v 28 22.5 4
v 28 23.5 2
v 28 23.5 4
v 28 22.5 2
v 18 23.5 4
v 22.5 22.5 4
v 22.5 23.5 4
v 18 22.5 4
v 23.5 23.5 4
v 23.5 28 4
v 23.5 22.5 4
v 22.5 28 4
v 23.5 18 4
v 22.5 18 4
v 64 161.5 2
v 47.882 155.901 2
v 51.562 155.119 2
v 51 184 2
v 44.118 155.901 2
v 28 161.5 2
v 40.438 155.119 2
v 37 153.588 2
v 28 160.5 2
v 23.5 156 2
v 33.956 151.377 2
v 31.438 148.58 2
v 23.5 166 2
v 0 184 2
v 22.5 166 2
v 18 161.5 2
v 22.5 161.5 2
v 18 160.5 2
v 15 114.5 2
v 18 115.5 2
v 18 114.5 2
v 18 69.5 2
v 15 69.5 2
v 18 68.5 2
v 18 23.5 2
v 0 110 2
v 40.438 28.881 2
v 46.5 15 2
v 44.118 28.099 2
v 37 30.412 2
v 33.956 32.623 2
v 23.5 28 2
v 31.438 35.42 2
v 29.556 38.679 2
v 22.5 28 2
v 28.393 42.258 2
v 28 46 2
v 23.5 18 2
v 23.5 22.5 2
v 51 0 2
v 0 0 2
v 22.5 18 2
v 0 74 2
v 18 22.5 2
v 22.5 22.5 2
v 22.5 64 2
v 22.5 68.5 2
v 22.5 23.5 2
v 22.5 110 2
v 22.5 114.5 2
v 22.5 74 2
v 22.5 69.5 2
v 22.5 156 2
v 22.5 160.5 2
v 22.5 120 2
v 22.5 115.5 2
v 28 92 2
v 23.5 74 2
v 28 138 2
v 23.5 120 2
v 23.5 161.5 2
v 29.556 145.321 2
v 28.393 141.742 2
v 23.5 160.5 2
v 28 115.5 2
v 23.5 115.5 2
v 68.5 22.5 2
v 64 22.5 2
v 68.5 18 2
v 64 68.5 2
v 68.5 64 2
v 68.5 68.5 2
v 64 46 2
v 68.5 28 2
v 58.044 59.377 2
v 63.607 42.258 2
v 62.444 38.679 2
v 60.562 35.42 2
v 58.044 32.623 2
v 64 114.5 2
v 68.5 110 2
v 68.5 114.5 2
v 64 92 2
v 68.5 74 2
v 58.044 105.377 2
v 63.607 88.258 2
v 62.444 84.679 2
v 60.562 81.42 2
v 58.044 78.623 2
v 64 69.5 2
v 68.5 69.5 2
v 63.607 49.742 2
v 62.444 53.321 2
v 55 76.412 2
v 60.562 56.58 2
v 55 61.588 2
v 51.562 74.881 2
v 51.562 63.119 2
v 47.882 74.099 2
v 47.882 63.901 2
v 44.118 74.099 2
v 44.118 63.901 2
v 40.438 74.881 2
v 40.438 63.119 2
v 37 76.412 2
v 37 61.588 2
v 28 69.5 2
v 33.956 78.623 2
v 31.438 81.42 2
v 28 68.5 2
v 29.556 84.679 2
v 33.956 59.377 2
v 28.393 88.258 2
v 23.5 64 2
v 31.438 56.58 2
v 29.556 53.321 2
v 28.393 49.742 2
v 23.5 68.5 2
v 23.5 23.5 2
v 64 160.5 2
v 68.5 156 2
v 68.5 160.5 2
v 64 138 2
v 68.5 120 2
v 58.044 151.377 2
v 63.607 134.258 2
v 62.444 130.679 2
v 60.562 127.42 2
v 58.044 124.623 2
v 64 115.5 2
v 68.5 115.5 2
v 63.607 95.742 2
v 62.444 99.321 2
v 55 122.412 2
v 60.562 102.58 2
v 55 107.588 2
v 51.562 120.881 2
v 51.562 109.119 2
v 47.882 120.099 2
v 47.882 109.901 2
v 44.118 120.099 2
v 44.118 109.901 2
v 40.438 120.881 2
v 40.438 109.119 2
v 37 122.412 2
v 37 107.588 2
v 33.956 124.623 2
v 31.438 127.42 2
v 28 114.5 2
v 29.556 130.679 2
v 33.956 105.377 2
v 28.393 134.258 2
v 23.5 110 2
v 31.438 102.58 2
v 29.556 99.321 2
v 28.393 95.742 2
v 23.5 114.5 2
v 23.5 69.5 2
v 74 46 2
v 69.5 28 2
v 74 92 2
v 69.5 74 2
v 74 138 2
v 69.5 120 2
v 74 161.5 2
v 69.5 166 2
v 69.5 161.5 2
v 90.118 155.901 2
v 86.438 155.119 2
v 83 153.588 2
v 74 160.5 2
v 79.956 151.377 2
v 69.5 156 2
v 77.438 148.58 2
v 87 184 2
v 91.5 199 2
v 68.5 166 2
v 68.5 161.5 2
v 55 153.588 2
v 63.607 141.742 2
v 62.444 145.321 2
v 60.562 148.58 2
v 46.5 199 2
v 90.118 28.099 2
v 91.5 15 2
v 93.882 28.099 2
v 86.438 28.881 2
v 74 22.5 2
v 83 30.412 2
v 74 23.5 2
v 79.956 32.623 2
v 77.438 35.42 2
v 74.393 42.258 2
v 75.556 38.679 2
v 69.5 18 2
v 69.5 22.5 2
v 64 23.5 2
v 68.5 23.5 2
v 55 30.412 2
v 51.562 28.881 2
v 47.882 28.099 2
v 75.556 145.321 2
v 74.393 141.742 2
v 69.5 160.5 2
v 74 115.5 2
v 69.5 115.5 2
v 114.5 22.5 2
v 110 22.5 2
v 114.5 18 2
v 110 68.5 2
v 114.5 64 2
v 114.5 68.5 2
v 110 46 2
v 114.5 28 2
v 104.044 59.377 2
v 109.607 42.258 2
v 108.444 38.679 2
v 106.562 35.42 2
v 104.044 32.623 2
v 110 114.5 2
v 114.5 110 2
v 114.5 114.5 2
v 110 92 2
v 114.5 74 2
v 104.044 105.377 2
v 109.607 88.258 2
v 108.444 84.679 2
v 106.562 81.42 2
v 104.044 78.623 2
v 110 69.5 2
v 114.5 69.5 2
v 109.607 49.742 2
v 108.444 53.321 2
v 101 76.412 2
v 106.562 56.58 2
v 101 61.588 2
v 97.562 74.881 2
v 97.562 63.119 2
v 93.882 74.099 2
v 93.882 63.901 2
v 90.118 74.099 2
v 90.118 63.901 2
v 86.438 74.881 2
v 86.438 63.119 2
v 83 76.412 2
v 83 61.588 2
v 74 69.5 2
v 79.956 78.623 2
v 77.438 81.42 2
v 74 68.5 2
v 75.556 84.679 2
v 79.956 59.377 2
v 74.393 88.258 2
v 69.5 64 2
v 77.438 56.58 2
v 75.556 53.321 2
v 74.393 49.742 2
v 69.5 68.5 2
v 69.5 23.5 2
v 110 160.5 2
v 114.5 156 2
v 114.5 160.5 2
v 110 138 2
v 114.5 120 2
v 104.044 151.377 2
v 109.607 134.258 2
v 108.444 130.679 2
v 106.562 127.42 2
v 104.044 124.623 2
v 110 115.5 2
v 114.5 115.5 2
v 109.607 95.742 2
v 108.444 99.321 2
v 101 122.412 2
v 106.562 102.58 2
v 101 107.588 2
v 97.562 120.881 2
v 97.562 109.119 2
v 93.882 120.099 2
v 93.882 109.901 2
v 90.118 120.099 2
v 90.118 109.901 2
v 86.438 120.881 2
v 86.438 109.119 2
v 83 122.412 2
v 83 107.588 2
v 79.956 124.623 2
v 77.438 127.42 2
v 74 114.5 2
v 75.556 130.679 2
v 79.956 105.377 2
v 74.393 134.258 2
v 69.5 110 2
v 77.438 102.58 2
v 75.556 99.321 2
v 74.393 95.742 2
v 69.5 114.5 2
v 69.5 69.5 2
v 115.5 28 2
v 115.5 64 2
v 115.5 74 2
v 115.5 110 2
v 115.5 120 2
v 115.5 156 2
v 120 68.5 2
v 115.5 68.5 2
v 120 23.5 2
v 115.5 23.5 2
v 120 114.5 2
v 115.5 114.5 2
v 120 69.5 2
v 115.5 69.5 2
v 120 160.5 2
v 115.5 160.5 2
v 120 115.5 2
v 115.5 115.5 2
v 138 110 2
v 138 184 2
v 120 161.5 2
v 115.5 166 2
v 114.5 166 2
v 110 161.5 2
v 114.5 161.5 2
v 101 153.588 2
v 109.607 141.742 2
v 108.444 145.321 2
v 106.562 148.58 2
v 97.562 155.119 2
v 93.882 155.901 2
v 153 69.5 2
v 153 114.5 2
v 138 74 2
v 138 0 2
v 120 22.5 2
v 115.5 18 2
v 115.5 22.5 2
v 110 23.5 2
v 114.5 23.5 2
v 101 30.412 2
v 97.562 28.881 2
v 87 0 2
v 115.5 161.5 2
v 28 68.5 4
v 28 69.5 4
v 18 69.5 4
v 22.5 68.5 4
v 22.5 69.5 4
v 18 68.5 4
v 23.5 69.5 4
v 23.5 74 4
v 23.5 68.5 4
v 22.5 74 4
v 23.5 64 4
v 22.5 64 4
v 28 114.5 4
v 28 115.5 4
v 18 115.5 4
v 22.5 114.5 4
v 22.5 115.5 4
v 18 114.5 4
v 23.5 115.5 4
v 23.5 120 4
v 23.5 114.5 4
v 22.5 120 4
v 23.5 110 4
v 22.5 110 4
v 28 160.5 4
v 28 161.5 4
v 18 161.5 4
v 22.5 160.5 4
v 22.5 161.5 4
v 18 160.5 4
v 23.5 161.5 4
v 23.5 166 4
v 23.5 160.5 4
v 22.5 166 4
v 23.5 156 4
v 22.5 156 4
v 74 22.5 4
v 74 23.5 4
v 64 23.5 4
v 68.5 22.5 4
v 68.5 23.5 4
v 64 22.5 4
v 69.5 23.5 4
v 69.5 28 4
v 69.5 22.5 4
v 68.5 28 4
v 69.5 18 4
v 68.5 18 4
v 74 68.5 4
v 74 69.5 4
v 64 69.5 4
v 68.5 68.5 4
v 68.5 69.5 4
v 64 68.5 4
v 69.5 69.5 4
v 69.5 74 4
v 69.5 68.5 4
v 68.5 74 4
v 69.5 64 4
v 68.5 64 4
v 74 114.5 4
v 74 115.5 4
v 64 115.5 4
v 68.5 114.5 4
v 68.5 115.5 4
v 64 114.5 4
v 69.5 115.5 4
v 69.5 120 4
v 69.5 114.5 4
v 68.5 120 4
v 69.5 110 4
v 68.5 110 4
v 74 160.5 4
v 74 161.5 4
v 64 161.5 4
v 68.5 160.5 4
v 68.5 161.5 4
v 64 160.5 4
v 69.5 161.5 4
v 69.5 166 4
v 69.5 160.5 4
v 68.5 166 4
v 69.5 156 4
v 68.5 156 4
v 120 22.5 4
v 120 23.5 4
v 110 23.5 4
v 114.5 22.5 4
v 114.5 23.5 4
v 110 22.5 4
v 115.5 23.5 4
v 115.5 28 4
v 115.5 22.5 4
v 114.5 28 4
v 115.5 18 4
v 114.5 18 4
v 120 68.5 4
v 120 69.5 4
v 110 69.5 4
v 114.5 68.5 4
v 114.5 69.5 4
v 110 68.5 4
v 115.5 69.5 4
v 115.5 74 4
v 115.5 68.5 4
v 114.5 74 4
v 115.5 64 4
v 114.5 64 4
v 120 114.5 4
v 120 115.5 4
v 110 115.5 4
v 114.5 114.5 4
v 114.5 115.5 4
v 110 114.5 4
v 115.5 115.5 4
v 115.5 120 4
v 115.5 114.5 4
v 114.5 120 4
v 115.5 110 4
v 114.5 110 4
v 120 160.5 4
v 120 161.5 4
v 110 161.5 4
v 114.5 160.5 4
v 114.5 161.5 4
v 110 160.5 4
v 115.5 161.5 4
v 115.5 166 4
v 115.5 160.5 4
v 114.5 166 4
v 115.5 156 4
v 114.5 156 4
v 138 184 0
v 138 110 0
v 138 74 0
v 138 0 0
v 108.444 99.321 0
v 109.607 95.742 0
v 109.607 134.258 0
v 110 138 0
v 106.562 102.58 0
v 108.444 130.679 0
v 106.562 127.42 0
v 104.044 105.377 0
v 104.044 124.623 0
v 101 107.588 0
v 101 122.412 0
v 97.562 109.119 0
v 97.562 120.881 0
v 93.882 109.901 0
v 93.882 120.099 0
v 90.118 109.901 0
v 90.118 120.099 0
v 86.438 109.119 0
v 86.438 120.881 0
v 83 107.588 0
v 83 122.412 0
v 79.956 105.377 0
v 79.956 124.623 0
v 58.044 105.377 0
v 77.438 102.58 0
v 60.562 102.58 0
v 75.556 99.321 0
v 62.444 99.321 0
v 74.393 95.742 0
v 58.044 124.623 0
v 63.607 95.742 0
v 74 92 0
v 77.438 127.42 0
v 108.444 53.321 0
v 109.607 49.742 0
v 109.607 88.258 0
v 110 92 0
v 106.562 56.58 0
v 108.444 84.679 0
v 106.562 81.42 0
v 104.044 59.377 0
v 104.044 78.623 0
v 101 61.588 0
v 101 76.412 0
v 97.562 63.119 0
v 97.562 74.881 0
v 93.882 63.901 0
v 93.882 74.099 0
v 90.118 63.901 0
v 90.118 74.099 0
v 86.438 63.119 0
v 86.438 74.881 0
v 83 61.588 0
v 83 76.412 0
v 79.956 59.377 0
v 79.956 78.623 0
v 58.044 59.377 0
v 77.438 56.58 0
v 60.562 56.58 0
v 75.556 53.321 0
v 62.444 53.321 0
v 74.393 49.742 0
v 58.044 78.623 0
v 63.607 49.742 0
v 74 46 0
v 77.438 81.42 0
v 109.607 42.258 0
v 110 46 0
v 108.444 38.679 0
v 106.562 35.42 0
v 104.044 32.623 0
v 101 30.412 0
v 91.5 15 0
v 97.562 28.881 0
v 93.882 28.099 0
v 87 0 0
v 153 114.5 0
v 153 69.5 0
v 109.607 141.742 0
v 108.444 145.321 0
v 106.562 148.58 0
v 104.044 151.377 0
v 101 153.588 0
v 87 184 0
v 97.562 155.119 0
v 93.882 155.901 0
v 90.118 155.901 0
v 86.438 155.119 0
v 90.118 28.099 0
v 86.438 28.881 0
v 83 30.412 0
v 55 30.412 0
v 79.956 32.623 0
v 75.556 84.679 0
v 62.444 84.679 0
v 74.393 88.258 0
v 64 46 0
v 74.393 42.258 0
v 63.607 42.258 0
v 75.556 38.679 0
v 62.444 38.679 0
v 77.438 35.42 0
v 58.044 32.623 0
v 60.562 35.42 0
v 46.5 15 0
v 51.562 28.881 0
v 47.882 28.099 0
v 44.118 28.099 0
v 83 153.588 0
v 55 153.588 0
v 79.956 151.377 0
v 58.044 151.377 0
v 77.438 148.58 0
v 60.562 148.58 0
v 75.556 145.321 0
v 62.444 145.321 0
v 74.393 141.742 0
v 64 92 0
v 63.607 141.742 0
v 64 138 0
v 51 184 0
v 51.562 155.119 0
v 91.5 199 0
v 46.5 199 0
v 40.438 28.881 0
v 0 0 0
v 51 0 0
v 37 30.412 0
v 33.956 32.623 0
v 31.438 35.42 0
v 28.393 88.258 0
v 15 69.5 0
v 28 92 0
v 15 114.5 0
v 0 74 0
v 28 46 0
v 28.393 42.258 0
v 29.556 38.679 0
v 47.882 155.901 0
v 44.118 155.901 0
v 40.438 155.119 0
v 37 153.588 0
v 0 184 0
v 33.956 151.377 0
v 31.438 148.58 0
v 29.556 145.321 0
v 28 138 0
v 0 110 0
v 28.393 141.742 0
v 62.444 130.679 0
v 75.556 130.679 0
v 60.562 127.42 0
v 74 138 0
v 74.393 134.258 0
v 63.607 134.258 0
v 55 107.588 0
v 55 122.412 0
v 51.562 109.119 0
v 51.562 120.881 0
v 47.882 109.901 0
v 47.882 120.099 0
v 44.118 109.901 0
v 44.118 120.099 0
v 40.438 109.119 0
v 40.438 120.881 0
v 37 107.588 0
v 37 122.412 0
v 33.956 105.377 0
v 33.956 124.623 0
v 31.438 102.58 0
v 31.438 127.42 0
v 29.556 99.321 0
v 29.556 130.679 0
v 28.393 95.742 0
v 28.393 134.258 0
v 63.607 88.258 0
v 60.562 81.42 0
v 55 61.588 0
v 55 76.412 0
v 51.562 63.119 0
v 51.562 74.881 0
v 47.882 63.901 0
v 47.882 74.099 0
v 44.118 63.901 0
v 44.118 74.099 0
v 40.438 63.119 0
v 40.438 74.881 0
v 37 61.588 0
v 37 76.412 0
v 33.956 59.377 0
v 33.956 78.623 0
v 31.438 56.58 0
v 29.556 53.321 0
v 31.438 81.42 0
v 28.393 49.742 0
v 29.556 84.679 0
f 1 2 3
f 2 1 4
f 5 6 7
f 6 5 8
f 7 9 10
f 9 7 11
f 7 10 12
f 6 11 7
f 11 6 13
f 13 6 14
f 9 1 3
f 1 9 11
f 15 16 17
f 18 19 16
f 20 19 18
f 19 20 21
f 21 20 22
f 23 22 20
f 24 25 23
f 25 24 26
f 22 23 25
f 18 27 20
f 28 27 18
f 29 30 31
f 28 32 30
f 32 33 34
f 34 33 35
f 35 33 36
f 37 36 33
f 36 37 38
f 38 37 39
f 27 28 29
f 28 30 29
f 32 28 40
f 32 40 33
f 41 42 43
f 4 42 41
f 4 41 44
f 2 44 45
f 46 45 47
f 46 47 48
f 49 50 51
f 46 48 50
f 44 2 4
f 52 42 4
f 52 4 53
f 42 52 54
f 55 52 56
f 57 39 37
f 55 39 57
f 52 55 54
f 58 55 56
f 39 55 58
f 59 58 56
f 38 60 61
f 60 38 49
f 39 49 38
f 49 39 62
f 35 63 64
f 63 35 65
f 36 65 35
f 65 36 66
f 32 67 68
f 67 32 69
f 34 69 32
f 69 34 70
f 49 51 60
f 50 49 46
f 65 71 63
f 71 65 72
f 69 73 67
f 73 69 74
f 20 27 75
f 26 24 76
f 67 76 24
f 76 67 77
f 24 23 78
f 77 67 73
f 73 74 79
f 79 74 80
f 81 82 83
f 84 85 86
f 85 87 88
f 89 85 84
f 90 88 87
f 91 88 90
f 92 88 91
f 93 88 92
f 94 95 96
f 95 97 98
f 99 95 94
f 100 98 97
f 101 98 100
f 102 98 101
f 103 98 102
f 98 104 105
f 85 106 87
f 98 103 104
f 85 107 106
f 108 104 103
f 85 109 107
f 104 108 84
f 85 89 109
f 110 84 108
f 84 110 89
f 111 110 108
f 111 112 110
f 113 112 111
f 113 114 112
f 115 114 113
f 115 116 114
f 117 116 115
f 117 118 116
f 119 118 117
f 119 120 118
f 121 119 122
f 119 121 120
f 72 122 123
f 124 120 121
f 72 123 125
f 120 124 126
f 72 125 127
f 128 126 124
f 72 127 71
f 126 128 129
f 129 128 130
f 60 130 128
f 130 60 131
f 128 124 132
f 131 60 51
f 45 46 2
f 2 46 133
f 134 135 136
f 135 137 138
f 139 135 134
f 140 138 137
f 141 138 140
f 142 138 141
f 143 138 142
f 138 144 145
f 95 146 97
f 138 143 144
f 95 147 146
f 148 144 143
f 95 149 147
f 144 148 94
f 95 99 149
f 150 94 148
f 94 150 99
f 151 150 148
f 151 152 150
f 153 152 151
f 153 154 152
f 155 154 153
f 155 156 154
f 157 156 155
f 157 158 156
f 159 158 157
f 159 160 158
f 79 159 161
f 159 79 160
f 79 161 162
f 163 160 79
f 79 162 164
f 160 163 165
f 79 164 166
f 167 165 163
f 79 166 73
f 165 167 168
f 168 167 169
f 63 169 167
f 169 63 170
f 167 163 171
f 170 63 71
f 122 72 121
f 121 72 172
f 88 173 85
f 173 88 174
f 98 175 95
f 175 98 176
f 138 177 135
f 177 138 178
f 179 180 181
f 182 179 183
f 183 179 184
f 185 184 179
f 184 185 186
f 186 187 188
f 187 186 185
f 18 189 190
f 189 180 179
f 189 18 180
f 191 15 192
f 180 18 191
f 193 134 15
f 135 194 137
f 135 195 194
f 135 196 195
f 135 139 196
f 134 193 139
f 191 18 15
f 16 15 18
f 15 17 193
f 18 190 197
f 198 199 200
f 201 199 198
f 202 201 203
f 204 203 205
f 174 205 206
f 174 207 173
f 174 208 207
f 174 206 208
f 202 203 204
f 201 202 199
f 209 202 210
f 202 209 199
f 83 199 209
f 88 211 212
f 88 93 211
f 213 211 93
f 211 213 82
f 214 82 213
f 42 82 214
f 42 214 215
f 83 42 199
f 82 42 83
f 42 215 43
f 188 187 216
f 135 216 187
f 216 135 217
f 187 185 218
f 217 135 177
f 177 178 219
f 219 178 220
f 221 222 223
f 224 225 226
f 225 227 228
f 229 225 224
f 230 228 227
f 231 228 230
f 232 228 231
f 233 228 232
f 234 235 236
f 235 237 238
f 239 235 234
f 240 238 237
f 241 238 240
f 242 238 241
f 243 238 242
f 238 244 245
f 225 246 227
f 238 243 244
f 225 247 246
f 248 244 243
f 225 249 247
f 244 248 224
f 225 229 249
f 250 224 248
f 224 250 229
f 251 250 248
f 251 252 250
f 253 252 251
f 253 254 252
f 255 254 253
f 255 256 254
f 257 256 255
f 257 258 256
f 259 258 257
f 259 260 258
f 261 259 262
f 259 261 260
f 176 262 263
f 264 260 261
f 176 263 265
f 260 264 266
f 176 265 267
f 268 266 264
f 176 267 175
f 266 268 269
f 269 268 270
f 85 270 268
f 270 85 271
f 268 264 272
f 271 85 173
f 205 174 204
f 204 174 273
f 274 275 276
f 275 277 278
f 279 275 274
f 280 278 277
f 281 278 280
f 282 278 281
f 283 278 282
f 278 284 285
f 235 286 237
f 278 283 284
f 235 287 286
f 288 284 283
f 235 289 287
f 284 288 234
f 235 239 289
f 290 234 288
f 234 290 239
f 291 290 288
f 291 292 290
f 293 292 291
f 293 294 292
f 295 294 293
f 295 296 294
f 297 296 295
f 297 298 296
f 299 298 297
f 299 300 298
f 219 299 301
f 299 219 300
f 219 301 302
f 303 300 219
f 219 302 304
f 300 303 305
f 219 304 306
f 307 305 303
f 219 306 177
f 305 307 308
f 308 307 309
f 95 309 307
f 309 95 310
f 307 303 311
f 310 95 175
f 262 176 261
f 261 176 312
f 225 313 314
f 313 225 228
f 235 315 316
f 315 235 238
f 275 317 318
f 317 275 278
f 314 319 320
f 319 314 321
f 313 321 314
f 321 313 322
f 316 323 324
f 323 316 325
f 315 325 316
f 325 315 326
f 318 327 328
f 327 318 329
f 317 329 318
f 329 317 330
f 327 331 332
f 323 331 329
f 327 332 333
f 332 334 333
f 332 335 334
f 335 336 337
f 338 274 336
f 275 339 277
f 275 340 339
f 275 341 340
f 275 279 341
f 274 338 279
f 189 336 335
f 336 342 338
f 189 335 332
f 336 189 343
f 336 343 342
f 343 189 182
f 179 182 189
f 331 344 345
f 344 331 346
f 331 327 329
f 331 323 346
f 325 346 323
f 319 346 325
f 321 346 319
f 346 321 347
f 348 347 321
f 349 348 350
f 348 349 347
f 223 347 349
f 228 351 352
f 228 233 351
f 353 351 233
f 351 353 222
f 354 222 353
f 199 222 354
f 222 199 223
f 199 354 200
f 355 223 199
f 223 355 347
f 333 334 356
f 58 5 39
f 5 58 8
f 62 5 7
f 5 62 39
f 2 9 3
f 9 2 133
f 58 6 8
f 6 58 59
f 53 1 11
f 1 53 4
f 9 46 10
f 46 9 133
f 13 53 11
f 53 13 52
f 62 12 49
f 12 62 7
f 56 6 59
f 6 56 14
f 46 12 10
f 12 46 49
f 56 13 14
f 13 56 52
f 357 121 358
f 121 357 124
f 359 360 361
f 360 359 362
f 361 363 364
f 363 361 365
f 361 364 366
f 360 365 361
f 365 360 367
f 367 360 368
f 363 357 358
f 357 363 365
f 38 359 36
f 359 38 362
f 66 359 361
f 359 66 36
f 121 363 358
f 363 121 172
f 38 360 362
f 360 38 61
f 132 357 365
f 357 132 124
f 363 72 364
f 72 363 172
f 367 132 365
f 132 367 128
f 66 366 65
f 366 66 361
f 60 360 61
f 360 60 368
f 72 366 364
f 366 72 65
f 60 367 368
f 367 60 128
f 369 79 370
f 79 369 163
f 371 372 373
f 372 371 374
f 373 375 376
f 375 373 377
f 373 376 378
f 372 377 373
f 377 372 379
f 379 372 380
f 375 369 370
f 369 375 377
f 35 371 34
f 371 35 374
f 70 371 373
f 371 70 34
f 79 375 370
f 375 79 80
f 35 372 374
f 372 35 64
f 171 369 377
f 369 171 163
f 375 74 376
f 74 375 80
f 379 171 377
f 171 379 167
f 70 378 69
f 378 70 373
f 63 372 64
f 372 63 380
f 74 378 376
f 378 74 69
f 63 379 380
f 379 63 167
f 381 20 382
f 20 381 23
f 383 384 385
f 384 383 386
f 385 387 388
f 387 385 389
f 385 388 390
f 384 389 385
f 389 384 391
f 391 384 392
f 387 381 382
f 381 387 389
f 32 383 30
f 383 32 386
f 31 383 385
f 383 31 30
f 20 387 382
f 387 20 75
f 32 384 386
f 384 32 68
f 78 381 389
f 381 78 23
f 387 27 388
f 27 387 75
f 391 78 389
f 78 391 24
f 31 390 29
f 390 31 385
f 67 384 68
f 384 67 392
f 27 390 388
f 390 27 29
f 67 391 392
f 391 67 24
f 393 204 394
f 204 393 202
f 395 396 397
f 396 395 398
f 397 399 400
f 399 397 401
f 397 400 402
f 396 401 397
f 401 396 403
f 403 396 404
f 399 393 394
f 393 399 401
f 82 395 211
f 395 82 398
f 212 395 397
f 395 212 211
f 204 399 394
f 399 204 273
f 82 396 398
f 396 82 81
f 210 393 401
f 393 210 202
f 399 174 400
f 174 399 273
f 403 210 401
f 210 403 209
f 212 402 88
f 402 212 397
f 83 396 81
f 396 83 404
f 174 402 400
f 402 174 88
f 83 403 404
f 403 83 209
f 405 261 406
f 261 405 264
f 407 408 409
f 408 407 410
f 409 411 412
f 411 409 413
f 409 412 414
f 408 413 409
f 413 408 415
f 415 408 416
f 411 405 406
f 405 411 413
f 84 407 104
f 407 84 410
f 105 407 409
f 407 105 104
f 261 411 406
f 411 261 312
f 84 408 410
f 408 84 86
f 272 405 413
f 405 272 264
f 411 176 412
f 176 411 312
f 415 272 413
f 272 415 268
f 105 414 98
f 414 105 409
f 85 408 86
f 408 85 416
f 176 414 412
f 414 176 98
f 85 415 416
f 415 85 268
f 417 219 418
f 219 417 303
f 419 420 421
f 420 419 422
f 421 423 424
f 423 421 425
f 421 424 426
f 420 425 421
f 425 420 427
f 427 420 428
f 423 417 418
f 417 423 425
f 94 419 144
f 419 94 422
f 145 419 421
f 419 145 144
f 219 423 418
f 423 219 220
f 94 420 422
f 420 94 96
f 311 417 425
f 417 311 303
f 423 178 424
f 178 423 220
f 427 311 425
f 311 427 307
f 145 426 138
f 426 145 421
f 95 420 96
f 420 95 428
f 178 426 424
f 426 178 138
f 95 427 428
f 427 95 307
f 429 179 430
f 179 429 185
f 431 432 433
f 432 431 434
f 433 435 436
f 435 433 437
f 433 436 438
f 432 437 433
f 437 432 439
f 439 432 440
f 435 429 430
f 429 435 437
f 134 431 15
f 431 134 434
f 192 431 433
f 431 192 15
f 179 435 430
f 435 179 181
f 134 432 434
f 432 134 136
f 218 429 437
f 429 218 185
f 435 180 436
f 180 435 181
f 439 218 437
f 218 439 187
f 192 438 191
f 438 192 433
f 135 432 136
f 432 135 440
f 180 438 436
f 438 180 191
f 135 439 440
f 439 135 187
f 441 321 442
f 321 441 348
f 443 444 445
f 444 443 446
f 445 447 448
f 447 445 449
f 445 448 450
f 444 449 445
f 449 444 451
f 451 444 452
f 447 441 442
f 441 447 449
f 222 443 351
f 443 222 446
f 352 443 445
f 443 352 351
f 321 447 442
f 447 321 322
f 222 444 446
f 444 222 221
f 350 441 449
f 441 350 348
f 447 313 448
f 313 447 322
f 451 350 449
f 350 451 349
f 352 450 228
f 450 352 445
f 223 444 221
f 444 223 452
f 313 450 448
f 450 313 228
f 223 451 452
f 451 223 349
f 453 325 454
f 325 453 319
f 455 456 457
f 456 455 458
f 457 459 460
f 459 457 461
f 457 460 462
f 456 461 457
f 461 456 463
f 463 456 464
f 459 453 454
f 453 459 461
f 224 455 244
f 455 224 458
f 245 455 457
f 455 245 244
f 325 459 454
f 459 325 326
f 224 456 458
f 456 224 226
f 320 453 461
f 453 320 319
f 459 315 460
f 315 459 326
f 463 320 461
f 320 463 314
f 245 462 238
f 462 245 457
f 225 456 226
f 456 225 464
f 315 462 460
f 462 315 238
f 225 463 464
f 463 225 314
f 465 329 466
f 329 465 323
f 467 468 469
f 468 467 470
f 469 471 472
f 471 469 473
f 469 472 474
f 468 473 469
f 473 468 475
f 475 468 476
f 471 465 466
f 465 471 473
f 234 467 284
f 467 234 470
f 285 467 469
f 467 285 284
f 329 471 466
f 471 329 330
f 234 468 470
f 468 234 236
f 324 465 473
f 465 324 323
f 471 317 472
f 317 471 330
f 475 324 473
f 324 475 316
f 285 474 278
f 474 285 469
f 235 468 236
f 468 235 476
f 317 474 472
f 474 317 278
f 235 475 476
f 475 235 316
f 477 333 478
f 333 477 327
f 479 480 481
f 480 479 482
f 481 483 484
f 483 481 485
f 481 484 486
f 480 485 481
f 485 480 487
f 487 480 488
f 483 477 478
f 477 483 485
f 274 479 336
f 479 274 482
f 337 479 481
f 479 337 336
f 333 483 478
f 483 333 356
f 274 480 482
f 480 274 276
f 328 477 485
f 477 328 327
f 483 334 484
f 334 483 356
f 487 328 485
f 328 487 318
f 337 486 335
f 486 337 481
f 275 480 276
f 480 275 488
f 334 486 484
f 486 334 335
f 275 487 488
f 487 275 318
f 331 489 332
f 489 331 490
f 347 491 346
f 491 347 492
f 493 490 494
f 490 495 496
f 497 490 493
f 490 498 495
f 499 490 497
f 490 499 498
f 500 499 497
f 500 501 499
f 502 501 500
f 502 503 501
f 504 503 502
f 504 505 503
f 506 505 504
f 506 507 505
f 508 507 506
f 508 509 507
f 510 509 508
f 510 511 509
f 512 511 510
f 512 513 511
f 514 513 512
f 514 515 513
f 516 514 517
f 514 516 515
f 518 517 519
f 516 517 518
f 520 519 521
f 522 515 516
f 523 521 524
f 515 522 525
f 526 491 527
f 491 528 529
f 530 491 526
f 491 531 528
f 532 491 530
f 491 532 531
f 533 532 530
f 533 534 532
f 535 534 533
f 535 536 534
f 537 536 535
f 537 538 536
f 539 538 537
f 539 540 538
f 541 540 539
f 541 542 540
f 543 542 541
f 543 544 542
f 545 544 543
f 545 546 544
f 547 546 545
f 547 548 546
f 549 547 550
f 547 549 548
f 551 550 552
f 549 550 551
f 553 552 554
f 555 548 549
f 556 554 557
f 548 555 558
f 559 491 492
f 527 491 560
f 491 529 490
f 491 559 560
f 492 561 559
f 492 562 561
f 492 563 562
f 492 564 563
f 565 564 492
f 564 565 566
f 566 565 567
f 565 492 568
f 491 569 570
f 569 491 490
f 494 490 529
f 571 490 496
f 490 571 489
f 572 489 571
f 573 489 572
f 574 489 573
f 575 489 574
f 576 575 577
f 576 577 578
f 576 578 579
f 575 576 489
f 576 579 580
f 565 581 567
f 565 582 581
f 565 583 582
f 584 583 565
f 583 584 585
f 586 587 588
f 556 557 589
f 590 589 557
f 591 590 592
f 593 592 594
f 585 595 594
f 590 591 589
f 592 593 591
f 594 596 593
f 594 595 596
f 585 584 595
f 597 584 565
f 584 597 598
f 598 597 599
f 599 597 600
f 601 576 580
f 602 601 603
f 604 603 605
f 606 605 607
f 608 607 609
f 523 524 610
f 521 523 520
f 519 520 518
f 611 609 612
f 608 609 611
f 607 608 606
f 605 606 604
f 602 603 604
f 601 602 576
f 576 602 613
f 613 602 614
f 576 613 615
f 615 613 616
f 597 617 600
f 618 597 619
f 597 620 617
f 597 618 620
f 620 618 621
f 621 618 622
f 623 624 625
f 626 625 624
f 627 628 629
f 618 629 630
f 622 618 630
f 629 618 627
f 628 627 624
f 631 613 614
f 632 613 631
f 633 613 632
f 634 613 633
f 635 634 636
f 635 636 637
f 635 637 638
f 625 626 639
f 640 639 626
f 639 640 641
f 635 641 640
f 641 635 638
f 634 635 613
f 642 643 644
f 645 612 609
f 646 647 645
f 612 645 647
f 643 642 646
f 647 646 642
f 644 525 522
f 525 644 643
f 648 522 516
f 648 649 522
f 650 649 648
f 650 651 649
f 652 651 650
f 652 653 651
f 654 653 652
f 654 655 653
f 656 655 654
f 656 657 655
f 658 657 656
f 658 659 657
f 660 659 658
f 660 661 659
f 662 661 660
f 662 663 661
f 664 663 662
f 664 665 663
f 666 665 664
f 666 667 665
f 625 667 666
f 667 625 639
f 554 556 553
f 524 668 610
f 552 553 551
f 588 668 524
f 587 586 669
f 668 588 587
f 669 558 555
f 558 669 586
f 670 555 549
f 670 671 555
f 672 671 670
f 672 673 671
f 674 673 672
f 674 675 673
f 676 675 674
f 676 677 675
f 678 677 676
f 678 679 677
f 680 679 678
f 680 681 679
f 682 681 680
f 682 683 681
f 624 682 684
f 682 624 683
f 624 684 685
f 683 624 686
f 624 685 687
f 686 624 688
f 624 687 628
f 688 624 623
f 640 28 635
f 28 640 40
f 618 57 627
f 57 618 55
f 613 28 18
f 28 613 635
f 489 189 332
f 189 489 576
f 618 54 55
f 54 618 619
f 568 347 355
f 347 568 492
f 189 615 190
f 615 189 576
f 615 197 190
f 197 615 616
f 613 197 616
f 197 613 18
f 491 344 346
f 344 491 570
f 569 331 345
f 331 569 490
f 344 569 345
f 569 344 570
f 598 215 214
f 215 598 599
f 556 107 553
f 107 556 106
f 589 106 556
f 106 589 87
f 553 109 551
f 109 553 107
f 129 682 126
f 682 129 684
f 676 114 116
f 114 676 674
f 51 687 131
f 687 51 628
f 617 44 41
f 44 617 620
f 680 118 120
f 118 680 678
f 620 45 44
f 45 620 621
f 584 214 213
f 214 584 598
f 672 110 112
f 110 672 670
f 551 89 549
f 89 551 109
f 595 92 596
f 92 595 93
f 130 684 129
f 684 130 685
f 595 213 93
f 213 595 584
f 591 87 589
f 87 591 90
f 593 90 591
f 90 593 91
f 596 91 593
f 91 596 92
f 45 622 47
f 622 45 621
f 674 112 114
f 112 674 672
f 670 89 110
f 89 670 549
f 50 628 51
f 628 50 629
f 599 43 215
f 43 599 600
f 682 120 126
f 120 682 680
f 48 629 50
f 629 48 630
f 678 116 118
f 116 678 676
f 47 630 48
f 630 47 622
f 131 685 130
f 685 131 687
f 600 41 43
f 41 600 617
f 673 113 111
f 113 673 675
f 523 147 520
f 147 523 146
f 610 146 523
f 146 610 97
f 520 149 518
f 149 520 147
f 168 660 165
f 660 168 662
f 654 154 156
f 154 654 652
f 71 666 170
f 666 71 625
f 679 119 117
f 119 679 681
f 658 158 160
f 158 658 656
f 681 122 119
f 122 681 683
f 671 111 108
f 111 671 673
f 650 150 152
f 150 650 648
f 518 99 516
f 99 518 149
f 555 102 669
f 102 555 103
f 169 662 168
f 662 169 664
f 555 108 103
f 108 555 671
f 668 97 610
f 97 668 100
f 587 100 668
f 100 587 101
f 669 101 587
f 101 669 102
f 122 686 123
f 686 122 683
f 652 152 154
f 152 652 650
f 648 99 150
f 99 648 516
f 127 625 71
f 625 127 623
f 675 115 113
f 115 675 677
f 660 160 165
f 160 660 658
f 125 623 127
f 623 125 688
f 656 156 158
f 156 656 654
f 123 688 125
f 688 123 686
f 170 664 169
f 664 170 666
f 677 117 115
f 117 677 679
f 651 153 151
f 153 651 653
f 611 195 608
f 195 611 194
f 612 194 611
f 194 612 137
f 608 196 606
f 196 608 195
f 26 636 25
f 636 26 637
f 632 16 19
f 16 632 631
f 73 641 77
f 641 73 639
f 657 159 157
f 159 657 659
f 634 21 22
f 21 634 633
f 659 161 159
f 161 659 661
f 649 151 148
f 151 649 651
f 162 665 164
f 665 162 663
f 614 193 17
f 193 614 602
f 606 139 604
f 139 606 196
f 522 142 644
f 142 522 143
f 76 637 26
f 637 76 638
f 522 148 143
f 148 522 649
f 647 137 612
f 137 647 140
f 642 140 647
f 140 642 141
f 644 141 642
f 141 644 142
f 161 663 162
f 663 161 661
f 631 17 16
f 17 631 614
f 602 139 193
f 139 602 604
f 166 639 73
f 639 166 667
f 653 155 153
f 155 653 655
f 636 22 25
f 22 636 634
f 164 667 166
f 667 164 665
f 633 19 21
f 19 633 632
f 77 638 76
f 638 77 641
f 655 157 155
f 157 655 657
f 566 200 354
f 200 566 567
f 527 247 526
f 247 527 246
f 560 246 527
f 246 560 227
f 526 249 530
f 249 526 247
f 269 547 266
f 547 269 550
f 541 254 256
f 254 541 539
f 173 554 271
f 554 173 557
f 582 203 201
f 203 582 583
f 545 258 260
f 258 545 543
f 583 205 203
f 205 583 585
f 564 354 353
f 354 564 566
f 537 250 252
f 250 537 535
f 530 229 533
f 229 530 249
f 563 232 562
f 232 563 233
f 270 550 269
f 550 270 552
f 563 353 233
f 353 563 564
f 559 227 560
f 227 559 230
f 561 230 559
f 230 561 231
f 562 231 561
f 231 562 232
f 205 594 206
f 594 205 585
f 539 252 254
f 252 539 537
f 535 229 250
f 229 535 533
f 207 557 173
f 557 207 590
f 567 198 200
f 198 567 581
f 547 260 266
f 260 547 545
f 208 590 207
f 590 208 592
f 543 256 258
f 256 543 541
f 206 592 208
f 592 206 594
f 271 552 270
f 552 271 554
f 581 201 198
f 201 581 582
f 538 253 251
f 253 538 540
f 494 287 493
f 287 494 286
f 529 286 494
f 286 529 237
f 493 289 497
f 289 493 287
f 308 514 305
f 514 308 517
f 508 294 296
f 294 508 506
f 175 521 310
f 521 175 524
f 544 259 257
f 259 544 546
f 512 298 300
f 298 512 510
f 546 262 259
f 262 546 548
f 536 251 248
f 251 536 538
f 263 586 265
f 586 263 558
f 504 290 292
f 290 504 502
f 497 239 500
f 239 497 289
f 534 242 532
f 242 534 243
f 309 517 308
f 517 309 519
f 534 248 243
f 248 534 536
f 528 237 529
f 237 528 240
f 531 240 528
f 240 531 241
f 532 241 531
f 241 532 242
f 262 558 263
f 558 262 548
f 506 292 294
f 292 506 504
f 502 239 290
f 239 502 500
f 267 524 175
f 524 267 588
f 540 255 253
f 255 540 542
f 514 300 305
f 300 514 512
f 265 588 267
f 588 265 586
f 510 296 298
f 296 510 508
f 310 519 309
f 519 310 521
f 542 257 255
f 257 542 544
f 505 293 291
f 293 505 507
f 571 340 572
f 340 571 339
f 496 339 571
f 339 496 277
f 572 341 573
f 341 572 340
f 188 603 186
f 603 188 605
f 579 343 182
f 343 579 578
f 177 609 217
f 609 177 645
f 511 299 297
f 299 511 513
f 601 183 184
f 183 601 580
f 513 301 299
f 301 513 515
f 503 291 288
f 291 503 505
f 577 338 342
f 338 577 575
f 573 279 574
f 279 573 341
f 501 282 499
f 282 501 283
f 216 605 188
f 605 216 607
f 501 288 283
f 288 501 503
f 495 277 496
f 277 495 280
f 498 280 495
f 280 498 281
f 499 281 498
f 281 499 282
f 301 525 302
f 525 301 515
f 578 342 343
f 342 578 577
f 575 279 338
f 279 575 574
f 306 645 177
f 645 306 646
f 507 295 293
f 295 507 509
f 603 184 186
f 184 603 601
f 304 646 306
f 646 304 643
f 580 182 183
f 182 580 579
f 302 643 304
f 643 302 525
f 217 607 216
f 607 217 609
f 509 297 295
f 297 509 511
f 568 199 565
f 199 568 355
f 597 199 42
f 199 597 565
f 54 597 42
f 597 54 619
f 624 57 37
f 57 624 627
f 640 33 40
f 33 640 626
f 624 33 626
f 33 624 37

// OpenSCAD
module center_cross(width, thickness, height) {
  translate([ 0, 0, height / 2 ]) {
    union() {
      cube(size = [ width, thickness, height ], center = true);
      cube(size = [ thickness, width, height ], center = true);
    }
  }
}

module notch(width, height, thickness) {
  scale([ width, height, 1 ]) {
    linear_extrude(height = thickness) {
      polygon(points = [ [ -0.4, 0 ], [ -0.5, 1 ], [ 0.5, 1 ], [ 0.4, 0 ] ],
              paths = [[ 0, 1, 2, 3 ]]);
    }
  }
}

tile_size = 45;

cross_width = 10;
cross_thickness = 1;
cross_height = 2;

board_width_mm = 190;
board_height_mm = 230;
board_thickness = 2;

notch_width = tile_size;
notch_height = tile_size / 3;

function getCount(size) = floor((size - notch_height) /
                                (tile_size + cross_thickness));

// number of tiles in both directions automatically calculated from desired size
// in mm
cross_x_count = getCount(board_width_mm);  // or set to a fixed number
cross_y_count = getCount(board_height_mm);

board_x_size = cross_x_count * (tile_size + cross_thickness);
board_y_size = cross_y_count * (tile_size + cross_thickness);


difference() {
  union() {
    // Base board
    cube(size = [ board_x_size, board_y_size, board_thickness ]);

    // positive notch top
    translate([ board_x_size / 2, board_y_size, 0 ]) {
      notch(notch_width, notch_height, board_thickness);
    }

    // positive notch right
    translate([ board_x_size, board_y_size / 2, 0 ]) {
      rotate([ 0, 0, -90 ]) {
        notch(notch_width, notch_height, board_thickness);
      }
    }

    // Crosses
    translate([ 0, 0, board_thickness ]) {
      for (i = [0:cross_x_count - 1]) {
        for (j = [0:cross_y_count - 1]) {
          x_offset = i * (tile_size + cross_thickness) + tile_size / 2 +
                     cross_thickness / 2;
          y_offset = j * (tile_size + cross_thickness) + tile_size / 2 +
                     cross_thickness / 2;
          translate([ x_offset, y_offset, 0 ]) {
            center_cross(cross_width, cross_thickness, cross_height);
          }
        }
      }
    }
  }

  // Holes
  for (i = [1:cross_x_count - 1]) {
    for (j = [1:cross_y_count - 1]) {
      x_offset = i * (tile_size + cross_thickness);
      y_offset = j * (tile_size + cross_thickness);
      translate([ x_offset, y_offset, board_thickness / 2 ]) {
        cylinder(r = tile_size * 0.4, h = board_thickness * 2, center = true);
      }
    }
  }

  translate([ 0, 0, -board_thickness / 2 ]) {
    scale([ 1, 1, 2 ]) {
      // negative notch bottom
      translate([ board_x_size / 2, 0, 0 ]) {
        notch(notch_width, notch_height, board_thickness);
      }

      // negative notch left
      translate([ 0, board_y_size / 2, 0 ]) {
        rotate([ 0, 0, -90 ]) {
          notch(notch_width, notch_height, board_thickness);
        }
      }
    }
  }
}
